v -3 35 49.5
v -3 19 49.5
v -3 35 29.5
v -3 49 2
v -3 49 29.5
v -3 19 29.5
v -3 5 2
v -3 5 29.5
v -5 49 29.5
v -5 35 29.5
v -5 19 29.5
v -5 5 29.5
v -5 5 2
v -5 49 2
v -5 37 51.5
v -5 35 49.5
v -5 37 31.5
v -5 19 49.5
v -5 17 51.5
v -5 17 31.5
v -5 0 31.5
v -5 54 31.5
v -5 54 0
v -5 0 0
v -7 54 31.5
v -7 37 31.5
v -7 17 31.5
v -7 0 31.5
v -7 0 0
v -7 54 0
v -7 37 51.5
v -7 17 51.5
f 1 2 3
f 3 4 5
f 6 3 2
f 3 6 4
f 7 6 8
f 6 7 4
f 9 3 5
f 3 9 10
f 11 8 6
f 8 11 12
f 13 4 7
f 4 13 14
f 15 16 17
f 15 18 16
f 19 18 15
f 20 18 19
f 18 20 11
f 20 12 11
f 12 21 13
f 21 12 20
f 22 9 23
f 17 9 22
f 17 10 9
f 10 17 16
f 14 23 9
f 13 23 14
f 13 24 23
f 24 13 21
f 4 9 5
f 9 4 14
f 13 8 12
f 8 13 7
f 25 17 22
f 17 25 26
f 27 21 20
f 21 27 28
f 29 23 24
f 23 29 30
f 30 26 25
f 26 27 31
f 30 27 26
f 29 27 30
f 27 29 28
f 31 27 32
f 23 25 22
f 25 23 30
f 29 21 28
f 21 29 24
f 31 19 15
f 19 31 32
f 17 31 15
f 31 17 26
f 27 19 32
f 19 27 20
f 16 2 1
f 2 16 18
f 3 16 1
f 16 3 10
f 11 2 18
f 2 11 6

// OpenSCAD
//width
w = 50;
//length
l = 57;
//bottom height
bh = 15;
//top height
th = 10;
//sensor measures
sh = 30;
sw = 16;
sd = 11;
//slide for smd
slide_margin = 3;
slide_height = 2.5;
//measures for usb port
usb_hole_width = 18;
usb_hole_height = 8;

triangle_length = 30;
//thickness of material
s=2;

//real height
h = bh + th + slide_height;

print_base = false;
print_top = true;

if(print_base) {
    difference() {
        union() {
        //main cube
        cube([l+s,w+2*s,h+2*s]);
        //additional cube for sensor
        translate([0,(w-sw)/2,s+bh+slide_height]) cube([sd+s,sw+2*s,sh+s]); 
        //triangle shape for air sensor
        translate([sd+s,w/2+sw/2+s*2,h+s*2])rotate([90,0,0])linear_extrude(sw+2*s)polygon([[0,0],[triangle_length,0],[0,sh-th]]);

        }

        //main cut out
        translate([0,s+slide_margin,s]) cube([l,w-2*slide_margin,h]);
        //cut for pcb slide
        translate([0,s,s+bh])cube([l,w,slide_height]);
        //cut for sensor
        translate([0,s+(w-sw)/2,s+bh+slide_height]) cube([sd,sw,sh]); 
        //sensor air holes
        translate([0,s+w/2-1,h+s*3])cube([100,2,sh-th-s*2]);
        translate([0,s+w/2-6,h+s*3])cube([100,2,sh-th-s*2]);
        translate([0,s+w/2+4,h+s*3])cube([100,2,sh-th-s*2]);
        //usb hole
        translate([0,s+(w-usb_hole_width)/2,s+bh+slide_height])cube([1000,usb_hole_width,usb_hole_height]);
    }
}
if(print_top) {
    
translate([-5,0,0]) {
    translate([0,s+slide_margin,s]) {
                cube([s,w-2*slide_margin,h]);
    }
    translate([-s,0,0]) cube([s,w+2*s,h+2*s]);
    translate([-s,w/2-sw/2,bh+slide_height+s]) cube([s,sw+s*2,sh+s]);

    translate([0,s+w/2-sw/2,bh+slide_height+s]) cube([s,sw,sh]);
}    
    
}
